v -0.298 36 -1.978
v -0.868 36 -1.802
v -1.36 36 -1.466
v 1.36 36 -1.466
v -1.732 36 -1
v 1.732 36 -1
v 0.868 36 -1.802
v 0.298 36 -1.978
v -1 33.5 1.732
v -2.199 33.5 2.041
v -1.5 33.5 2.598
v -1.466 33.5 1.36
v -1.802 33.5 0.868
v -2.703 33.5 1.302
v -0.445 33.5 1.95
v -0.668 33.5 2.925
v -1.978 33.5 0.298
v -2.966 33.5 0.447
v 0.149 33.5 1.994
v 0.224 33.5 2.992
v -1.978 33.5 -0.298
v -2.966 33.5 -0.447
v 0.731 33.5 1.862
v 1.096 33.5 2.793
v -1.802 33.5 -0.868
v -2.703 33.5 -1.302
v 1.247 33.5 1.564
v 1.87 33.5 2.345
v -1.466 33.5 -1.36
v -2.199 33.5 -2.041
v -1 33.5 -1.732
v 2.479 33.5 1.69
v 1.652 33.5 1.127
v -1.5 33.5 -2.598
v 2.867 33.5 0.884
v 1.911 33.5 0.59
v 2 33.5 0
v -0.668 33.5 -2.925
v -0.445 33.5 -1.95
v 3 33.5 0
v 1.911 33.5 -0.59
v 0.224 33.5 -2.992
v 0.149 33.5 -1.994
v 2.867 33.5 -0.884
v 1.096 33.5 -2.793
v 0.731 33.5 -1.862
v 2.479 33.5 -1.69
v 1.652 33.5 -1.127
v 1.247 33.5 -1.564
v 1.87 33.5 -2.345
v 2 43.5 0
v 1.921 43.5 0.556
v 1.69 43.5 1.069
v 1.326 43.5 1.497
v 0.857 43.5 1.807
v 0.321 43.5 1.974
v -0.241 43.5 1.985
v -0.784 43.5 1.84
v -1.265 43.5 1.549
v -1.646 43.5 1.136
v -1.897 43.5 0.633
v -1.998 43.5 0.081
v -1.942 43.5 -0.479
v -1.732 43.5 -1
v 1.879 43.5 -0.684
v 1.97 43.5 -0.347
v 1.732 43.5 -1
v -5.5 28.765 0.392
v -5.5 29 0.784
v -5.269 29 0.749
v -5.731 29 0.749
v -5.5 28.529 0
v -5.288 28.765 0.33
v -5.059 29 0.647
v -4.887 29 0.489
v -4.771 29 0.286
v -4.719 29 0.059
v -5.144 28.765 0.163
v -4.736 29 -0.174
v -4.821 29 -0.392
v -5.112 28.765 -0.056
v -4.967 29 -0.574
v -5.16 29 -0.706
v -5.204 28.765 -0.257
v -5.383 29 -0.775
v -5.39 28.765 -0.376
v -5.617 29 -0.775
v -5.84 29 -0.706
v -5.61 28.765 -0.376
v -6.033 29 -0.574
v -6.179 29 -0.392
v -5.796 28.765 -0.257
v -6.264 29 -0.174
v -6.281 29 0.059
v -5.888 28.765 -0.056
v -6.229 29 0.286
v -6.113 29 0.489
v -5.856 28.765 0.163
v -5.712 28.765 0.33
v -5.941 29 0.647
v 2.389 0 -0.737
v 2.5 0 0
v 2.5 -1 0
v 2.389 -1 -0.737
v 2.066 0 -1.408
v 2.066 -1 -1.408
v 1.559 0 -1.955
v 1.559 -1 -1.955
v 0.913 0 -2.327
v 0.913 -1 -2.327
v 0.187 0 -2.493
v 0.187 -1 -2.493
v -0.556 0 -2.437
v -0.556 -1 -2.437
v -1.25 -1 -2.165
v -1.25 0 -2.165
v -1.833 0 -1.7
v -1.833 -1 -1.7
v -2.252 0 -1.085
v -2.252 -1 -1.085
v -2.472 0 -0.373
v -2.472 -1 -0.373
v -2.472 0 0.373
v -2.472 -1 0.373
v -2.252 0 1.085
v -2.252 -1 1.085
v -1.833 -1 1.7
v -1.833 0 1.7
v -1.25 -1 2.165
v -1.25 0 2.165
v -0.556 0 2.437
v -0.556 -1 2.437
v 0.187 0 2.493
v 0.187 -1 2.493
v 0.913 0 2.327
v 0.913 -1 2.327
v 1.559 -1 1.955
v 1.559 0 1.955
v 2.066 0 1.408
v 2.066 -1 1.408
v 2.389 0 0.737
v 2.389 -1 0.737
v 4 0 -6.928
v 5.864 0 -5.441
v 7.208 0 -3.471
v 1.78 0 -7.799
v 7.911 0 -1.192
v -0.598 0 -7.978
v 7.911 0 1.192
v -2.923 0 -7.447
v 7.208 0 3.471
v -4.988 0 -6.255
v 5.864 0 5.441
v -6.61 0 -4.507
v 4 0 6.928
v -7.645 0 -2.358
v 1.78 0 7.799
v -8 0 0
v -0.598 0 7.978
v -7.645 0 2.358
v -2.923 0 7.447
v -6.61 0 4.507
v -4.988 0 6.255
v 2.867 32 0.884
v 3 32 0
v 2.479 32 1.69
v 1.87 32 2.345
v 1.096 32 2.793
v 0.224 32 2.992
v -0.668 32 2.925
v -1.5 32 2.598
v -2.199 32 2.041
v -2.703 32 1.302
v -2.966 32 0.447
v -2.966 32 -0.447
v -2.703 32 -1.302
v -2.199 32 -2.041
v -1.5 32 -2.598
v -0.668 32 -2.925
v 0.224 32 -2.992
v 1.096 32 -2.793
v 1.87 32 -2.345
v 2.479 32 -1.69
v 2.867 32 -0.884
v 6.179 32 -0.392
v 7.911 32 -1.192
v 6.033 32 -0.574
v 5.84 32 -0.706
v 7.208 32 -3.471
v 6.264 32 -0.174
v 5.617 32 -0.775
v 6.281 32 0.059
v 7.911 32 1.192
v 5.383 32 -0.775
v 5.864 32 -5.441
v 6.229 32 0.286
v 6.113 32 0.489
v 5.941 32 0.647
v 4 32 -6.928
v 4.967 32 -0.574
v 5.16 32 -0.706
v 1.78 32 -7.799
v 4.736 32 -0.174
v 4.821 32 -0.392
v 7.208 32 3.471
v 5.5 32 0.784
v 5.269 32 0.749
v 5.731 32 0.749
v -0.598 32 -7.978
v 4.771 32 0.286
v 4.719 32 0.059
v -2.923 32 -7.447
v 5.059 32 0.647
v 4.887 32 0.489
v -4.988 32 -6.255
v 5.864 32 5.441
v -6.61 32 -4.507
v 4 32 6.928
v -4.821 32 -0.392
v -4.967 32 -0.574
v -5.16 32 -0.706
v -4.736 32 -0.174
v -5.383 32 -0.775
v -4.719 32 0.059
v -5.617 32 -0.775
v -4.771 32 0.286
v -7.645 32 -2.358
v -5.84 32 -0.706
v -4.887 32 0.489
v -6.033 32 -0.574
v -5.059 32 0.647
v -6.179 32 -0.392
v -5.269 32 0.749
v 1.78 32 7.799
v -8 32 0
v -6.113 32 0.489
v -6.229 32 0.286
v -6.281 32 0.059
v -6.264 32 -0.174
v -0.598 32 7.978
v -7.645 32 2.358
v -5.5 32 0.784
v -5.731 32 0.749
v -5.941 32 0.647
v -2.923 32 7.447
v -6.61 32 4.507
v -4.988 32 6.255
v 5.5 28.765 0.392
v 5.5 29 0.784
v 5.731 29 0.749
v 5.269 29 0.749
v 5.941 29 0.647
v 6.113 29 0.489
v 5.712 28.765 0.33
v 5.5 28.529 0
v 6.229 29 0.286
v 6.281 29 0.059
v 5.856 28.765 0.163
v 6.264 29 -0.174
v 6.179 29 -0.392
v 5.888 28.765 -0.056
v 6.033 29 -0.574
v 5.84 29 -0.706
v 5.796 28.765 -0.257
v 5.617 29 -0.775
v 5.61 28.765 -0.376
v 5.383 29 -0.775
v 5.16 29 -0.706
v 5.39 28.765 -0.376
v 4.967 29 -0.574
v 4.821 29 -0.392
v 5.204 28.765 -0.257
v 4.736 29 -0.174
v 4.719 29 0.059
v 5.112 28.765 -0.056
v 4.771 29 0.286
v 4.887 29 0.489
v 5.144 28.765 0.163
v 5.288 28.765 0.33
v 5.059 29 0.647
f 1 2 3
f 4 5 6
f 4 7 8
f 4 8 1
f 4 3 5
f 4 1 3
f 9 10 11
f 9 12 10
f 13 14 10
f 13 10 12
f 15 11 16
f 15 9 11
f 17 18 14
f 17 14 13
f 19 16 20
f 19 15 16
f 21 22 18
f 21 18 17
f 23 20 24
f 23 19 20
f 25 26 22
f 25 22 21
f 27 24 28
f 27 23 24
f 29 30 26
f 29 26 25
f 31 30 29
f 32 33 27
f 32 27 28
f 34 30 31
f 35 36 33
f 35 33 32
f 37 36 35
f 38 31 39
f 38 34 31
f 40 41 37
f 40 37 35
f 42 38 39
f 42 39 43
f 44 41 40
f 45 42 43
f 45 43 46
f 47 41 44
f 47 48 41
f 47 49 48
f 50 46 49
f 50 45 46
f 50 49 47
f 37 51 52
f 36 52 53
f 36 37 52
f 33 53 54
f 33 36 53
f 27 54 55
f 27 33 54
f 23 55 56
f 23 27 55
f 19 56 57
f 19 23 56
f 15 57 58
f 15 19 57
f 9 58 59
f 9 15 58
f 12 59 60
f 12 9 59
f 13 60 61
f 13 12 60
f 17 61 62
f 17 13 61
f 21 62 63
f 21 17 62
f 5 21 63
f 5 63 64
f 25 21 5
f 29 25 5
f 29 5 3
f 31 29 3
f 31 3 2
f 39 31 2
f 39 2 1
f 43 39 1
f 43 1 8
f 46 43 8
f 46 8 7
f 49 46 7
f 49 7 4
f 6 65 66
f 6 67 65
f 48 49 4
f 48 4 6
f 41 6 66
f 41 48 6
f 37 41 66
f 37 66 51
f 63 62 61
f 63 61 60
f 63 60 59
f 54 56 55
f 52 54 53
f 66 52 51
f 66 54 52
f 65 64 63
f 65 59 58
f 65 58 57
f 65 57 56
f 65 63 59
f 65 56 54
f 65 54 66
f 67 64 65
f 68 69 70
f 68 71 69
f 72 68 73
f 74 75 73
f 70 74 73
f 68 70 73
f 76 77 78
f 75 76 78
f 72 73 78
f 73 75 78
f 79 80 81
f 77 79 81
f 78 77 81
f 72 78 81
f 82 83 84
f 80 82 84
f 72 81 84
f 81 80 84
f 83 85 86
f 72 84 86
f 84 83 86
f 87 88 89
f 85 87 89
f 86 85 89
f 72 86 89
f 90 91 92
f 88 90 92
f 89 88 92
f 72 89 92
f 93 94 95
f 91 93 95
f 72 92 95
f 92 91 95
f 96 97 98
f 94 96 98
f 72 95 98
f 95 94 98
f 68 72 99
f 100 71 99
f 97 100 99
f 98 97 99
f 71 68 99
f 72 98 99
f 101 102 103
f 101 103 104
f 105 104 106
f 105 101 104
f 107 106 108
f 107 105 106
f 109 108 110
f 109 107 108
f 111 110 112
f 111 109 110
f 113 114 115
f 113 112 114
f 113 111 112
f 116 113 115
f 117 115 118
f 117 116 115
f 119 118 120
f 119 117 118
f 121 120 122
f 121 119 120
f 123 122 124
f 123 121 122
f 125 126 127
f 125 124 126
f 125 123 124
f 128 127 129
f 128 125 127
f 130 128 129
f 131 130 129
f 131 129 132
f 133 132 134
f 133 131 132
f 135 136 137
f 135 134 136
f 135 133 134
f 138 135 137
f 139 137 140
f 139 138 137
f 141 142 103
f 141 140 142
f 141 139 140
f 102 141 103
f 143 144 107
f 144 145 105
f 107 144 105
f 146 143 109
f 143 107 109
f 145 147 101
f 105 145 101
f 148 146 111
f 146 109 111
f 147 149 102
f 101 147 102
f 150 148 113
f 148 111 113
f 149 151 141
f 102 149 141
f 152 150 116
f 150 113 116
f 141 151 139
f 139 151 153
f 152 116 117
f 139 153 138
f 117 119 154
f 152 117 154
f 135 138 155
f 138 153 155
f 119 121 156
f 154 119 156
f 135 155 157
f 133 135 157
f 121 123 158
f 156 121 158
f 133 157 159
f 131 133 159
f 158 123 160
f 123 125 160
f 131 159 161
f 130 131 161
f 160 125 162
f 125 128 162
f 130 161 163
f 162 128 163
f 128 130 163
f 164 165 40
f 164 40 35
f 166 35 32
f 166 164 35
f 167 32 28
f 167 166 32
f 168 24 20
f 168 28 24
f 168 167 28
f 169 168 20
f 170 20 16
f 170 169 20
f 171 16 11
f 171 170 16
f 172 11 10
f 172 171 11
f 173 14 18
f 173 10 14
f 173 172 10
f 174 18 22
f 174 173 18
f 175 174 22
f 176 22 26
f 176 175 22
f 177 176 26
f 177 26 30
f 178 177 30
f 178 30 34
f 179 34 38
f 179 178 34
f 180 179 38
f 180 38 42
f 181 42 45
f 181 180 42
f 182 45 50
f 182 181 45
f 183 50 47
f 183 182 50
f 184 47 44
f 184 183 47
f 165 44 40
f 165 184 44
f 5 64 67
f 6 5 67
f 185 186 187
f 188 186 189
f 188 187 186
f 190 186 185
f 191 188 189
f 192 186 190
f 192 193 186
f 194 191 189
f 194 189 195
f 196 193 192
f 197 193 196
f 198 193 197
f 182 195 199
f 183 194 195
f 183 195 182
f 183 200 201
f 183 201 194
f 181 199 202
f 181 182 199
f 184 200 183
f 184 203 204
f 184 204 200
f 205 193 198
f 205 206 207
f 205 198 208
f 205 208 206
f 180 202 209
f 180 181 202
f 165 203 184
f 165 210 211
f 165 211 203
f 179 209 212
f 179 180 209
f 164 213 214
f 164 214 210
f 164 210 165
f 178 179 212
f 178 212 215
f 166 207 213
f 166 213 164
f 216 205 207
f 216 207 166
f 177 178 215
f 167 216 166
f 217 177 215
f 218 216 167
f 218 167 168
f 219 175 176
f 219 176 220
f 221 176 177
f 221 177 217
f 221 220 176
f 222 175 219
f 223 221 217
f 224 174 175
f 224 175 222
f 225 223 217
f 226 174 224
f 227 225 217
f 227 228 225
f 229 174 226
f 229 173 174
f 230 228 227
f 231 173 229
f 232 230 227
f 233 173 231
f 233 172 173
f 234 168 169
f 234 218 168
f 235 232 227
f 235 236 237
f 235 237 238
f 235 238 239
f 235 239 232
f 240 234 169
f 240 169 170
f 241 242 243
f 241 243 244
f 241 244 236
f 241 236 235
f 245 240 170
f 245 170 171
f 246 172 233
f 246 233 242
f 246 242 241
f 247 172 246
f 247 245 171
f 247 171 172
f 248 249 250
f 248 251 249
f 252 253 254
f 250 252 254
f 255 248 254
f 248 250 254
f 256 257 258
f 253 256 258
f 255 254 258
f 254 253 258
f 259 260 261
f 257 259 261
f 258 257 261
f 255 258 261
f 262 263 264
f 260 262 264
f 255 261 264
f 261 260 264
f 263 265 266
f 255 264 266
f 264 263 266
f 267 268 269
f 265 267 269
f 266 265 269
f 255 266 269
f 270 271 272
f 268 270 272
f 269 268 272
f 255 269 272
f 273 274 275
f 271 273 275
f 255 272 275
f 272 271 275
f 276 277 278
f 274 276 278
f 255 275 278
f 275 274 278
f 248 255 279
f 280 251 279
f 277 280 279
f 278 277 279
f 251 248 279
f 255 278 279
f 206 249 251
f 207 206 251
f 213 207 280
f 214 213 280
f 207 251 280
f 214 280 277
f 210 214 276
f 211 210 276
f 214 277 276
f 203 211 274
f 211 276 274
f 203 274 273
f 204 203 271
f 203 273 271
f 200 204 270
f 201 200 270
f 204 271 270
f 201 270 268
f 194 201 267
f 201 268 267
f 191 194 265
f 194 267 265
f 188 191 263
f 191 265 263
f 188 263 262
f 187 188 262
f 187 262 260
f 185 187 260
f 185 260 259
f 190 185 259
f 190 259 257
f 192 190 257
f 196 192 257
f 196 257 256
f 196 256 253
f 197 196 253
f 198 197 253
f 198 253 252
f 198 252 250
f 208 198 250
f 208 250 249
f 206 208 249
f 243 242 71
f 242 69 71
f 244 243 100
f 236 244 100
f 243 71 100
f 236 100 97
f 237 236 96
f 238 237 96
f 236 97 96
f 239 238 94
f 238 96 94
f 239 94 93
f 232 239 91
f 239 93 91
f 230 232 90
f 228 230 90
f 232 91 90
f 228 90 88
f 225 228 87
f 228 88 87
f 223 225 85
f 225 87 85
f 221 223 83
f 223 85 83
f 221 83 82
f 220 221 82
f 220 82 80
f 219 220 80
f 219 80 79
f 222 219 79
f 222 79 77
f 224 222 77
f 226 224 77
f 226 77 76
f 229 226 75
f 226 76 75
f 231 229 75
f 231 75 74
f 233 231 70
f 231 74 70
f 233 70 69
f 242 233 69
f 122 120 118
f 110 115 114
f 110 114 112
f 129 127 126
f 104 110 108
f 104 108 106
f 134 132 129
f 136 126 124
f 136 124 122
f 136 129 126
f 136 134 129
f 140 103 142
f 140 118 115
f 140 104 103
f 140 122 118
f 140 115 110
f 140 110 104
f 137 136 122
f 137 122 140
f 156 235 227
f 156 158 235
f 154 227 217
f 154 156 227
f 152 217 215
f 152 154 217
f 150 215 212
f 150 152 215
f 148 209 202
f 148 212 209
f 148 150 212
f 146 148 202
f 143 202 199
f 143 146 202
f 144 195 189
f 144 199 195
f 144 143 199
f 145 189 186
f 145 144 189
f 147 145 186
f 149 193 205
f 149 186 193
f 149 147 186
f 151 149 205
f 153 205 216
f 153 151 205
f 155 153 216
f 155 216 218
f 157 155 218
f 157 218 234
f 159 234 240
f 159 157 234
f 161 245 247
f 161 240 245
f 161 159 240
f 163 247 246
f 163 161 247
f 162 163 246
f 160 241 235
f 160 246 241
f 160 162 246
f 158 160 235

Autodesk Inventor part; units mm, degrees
ref_plane "YZ Plane" through (0, 0, 0) normal (1, 0, 0) x (0, 1, 0)
ref_plane "XZ Plane" through (0, 0, 0) normal (0, 1, 0) x (-1, 0, 0)
ref_plane "XY Plane" through (0, 0, 0) normal (0, 0, 1) x (1, 0, 0)
sketch "Sketch1" plane through (0, 0, 0) normal (0, 1, 0) x (-1, 0, 0)
  circle A0 centre (0, 0) radius 8
  dimension "d0" = 16
extrude "Extrusion1" add sketch "Sketch1" along normal blind 32
sketch "Sketch2" plane through (0, 32, 0) normal (0, 1, 0) x (1, 0, 0)
  circle A0 centre (0, 0) radius 8 projected
  circle A1 centre (0, 0) radius 3
  point P0 (5.5, 0)
  point P1 (-5.5, 0)
  dimension "d3" = 6
  dimension "d4" = 5.5
  dimension "d7" = 360
extrude "Extrusion2" add sketch "Sketch2" along normal blind 1.5 contours A1
hole "Hole1" at (5.5, 32, 0) at (-5.5, 32, 0) direction (0, -1, 0) diameter 1.567 depth 3 tip angle 118 thread size "M2x0.4" class "6H" standard "ANSI Metric M Profile"
sketch "Sketch3" plane through (0, 33.5, 0) normal (0, 1, 0) x (1, 0, 0)
  circle A0 centre (0, 0) radius 3 projected
  circle A1 centre (0, 0) radius 2
  dimension "d18" = 4
extrude "Extrusion3" add sketch "Sketch3" along normal blind 10 contours A1
sketch "Sketch4" plane through (0, 43.5, 0) normal (0, 1, 0) x (1, 0, 0)
  circle A0 centre (0, 0) radius 2 projected
  arc A1 (1.7321, 1) -> (-1.7321, 1) centre (0, 0) ccw
  line L0 (-1.7321, 1) -> (1.7321, 1)
  dimension "d21" = 1
  dimension "d23" = 1
extrude "Extrusion4" cut sketch "Sketch4" against normal blind 7.5 contours L0 A0 picked at (0.4849, 1.1242)
sketch "Sketch5" plane through (0, 0, 0) normal (0, -1, 0) x (1, 0, 0)
  circle A0 centre (0, 0) radius 8 projected
  circle A1 centre (0, 0) radius 2.5
  dimension "d26" = 5
extrude "Extrusion5" add sketch "Sketch5" along normal blind 1 contours A1
properties part number "motor_43dsd"
